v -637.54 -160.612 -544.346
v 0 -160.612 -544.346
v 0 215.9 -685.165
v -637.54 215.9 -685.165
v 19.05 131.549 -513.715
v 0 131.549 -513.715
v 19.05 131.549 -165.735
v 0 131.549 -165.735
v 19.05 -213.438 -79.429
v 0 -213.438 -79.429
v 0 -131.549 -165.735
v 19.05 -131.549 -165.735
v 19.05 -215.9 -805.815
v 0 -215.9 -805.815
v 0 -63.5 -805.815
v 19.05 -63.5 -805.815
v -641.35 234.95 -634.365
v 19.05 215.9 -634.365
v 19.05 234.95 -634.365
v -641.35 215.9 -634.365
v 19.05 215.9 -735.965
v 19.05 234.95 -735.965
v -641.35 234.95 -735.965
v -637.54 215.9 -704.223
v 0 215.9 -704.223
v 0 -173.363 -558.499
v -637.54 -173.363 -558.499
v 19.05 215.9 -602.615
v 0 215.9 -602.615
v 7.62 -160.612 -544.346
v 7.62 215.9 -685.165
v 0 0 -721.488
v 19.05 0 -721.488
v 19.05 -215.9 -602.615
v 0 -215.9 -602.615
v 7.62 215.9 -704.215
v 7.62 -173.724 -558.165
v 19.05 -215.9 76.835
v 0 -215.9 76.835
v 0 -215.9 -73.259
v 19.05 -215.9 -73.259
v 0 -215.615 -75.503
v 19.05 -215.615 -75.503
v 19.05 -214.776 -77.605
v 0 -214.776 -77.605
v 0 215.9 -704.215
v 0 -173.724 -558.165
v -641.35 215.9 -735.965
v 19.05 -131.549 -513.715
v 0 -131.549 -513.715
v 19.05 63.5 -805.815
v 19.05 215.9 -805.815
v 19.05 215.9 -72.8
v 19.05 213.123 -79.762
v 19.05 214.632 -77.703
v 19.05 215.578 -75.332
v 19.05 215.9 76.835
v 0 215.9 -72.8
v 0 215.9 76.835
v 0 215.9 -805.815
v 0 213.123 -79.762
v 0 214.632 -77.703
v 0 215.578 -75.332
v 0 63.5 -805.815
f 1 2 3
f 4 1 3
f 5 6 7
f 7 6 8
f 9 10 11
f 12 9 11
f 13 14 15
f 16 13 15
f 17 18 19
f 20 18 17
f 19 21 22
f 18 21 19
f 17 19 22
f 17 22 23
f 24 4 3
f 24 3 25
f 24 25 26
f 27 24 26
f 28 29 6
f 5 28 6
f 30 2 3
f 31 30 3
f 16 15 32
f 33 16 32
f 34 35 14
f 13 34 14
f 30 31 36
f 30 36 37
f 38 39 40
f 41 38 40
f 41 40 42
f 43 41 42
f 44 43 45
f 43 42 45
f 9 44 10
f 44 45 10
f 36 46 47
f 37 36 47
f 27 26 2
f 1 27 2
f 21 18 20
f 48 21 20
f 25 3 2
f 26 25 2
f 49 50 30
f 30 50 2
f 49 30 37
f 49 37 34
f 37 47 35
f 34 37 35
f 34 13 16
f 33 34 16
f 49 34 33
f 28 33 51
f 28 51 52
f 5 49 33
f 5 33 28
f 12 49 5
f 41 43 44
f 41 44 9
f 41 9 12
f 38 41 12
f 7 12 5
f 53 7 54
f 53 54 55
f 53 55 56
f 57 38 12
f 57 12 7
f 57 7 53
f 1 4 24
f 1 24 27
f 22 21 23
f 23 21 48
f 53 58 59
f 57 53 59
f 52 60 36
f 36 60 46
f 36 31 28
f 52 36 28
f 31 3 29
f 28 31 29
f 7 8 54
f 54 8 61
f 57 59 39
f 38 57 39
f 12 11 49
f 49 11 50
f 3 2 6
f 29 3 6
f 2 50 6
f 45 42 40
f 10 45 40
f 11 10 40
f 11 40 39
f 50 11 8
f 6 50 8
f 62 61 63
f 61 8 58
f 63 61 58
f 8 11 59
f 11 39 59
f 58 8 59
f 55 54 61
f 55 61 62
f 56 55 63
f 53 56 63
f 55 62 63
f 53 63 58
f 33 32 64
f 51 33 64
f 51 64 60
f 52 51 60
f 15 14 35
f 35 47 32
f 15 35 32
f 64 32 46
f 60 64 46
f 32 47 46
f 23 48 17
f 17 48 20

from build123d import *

# Parameters (mm, degrees)
F1_DEPTH = 19.05
F3_DEPTH = 7.62
F4_W     = 660.4
F4_H     = 101.6
F5_DEPTH = 19.05
F7_DEPTH = 637.54


with BuildPart() as f1:
    # F0 (on Right) → F1 (new body)
    with BuildSketch(Plane.YZ):
        with BuildLine():
            Line((215.9, -72.799858), (215.9, 76.835))
            Line((215.9, 76.835), (-215.9, 76.835))
            Line((-215.9, 76.835), (-215.9, -73.258757))
            ThreePointArc((-215.9, -73.258757), (-215.261906, -76.580452), (-213.43846, -79.429289))
            Line((-213.43846, -79.429289), (-131.548995, -165.735))
            Line((-131.548995, -165.735), (-131.548995, -513.715))
            Line((-131.548995, -513.715), (-215.9, -602.615))
            Line((-215.9, -602.615), (-215.9, -805.815))
            Line((-215.9, -805.815), (-63.5, -805.815))
            Line((-63.5, -805.815), (0, -721.487939))
            Line((0, -721.487939), (63.5, -805.815))
            Line((63.5, -805.815), (215.9, -805.815))
            Line((215.9, -805.815), (215.9, -602.615))
            Line((215.9, -602.615), (131.548995, -513.715))
            Line((131.548995, -513.715), (131.548995, -165.735))
            Line((131.548995, -165.735), (213.122599, -79.762185))
            ThreePointArc((213.122599, -79.762185), (215.180027, -76.547789), (215.9, -72.799858))
        make_face()
    extrude(amount=F1_DEPTH)

    # F2 (on face) → F3 (cut)
    with BuildSketch(Plane(origin=(0, 0, 0), x_dir=(0, -1, 0), z_dir=(-1, 0, 0))):
        Polygon((-215.9, -685.165), (-215.9, -704.215), (173.724498, -558.165), (160.61232, -544.345691), align=None)
    extrude(amount=-F3_DEPTH, mode=Mode.SUBTRACT)


with BuildPart() as f5:
    # F4 (on face) → F5 (new body)
    with BuildSketch(Plane(origin=(0, 215.9, 0), x_dir=(-1, 0, 0), z_dir=(0, 1, 0))):
        with Locations((311.15, -685.165)):
            Rectangle(F4_W, F4_H)
    extrude(amount=F5_DEPTH)


with BuildPart() as f7:
    # F6 (on face) → F7 (new body)
    with BuildSketch(Plane(origin=(0, 0, 0), x_dir=(0, -1, 0), z_dir=(-1, 0, 0))):
        Polygon((160.61232, -544.345691), (-215.9, -685.165), (-215.9, -704.223394), (173.363048, -558.499187), align=None)
    extrude(amount=F7_DEPTH)


solid = Compound([f1.part, f5.part, f7.part])
